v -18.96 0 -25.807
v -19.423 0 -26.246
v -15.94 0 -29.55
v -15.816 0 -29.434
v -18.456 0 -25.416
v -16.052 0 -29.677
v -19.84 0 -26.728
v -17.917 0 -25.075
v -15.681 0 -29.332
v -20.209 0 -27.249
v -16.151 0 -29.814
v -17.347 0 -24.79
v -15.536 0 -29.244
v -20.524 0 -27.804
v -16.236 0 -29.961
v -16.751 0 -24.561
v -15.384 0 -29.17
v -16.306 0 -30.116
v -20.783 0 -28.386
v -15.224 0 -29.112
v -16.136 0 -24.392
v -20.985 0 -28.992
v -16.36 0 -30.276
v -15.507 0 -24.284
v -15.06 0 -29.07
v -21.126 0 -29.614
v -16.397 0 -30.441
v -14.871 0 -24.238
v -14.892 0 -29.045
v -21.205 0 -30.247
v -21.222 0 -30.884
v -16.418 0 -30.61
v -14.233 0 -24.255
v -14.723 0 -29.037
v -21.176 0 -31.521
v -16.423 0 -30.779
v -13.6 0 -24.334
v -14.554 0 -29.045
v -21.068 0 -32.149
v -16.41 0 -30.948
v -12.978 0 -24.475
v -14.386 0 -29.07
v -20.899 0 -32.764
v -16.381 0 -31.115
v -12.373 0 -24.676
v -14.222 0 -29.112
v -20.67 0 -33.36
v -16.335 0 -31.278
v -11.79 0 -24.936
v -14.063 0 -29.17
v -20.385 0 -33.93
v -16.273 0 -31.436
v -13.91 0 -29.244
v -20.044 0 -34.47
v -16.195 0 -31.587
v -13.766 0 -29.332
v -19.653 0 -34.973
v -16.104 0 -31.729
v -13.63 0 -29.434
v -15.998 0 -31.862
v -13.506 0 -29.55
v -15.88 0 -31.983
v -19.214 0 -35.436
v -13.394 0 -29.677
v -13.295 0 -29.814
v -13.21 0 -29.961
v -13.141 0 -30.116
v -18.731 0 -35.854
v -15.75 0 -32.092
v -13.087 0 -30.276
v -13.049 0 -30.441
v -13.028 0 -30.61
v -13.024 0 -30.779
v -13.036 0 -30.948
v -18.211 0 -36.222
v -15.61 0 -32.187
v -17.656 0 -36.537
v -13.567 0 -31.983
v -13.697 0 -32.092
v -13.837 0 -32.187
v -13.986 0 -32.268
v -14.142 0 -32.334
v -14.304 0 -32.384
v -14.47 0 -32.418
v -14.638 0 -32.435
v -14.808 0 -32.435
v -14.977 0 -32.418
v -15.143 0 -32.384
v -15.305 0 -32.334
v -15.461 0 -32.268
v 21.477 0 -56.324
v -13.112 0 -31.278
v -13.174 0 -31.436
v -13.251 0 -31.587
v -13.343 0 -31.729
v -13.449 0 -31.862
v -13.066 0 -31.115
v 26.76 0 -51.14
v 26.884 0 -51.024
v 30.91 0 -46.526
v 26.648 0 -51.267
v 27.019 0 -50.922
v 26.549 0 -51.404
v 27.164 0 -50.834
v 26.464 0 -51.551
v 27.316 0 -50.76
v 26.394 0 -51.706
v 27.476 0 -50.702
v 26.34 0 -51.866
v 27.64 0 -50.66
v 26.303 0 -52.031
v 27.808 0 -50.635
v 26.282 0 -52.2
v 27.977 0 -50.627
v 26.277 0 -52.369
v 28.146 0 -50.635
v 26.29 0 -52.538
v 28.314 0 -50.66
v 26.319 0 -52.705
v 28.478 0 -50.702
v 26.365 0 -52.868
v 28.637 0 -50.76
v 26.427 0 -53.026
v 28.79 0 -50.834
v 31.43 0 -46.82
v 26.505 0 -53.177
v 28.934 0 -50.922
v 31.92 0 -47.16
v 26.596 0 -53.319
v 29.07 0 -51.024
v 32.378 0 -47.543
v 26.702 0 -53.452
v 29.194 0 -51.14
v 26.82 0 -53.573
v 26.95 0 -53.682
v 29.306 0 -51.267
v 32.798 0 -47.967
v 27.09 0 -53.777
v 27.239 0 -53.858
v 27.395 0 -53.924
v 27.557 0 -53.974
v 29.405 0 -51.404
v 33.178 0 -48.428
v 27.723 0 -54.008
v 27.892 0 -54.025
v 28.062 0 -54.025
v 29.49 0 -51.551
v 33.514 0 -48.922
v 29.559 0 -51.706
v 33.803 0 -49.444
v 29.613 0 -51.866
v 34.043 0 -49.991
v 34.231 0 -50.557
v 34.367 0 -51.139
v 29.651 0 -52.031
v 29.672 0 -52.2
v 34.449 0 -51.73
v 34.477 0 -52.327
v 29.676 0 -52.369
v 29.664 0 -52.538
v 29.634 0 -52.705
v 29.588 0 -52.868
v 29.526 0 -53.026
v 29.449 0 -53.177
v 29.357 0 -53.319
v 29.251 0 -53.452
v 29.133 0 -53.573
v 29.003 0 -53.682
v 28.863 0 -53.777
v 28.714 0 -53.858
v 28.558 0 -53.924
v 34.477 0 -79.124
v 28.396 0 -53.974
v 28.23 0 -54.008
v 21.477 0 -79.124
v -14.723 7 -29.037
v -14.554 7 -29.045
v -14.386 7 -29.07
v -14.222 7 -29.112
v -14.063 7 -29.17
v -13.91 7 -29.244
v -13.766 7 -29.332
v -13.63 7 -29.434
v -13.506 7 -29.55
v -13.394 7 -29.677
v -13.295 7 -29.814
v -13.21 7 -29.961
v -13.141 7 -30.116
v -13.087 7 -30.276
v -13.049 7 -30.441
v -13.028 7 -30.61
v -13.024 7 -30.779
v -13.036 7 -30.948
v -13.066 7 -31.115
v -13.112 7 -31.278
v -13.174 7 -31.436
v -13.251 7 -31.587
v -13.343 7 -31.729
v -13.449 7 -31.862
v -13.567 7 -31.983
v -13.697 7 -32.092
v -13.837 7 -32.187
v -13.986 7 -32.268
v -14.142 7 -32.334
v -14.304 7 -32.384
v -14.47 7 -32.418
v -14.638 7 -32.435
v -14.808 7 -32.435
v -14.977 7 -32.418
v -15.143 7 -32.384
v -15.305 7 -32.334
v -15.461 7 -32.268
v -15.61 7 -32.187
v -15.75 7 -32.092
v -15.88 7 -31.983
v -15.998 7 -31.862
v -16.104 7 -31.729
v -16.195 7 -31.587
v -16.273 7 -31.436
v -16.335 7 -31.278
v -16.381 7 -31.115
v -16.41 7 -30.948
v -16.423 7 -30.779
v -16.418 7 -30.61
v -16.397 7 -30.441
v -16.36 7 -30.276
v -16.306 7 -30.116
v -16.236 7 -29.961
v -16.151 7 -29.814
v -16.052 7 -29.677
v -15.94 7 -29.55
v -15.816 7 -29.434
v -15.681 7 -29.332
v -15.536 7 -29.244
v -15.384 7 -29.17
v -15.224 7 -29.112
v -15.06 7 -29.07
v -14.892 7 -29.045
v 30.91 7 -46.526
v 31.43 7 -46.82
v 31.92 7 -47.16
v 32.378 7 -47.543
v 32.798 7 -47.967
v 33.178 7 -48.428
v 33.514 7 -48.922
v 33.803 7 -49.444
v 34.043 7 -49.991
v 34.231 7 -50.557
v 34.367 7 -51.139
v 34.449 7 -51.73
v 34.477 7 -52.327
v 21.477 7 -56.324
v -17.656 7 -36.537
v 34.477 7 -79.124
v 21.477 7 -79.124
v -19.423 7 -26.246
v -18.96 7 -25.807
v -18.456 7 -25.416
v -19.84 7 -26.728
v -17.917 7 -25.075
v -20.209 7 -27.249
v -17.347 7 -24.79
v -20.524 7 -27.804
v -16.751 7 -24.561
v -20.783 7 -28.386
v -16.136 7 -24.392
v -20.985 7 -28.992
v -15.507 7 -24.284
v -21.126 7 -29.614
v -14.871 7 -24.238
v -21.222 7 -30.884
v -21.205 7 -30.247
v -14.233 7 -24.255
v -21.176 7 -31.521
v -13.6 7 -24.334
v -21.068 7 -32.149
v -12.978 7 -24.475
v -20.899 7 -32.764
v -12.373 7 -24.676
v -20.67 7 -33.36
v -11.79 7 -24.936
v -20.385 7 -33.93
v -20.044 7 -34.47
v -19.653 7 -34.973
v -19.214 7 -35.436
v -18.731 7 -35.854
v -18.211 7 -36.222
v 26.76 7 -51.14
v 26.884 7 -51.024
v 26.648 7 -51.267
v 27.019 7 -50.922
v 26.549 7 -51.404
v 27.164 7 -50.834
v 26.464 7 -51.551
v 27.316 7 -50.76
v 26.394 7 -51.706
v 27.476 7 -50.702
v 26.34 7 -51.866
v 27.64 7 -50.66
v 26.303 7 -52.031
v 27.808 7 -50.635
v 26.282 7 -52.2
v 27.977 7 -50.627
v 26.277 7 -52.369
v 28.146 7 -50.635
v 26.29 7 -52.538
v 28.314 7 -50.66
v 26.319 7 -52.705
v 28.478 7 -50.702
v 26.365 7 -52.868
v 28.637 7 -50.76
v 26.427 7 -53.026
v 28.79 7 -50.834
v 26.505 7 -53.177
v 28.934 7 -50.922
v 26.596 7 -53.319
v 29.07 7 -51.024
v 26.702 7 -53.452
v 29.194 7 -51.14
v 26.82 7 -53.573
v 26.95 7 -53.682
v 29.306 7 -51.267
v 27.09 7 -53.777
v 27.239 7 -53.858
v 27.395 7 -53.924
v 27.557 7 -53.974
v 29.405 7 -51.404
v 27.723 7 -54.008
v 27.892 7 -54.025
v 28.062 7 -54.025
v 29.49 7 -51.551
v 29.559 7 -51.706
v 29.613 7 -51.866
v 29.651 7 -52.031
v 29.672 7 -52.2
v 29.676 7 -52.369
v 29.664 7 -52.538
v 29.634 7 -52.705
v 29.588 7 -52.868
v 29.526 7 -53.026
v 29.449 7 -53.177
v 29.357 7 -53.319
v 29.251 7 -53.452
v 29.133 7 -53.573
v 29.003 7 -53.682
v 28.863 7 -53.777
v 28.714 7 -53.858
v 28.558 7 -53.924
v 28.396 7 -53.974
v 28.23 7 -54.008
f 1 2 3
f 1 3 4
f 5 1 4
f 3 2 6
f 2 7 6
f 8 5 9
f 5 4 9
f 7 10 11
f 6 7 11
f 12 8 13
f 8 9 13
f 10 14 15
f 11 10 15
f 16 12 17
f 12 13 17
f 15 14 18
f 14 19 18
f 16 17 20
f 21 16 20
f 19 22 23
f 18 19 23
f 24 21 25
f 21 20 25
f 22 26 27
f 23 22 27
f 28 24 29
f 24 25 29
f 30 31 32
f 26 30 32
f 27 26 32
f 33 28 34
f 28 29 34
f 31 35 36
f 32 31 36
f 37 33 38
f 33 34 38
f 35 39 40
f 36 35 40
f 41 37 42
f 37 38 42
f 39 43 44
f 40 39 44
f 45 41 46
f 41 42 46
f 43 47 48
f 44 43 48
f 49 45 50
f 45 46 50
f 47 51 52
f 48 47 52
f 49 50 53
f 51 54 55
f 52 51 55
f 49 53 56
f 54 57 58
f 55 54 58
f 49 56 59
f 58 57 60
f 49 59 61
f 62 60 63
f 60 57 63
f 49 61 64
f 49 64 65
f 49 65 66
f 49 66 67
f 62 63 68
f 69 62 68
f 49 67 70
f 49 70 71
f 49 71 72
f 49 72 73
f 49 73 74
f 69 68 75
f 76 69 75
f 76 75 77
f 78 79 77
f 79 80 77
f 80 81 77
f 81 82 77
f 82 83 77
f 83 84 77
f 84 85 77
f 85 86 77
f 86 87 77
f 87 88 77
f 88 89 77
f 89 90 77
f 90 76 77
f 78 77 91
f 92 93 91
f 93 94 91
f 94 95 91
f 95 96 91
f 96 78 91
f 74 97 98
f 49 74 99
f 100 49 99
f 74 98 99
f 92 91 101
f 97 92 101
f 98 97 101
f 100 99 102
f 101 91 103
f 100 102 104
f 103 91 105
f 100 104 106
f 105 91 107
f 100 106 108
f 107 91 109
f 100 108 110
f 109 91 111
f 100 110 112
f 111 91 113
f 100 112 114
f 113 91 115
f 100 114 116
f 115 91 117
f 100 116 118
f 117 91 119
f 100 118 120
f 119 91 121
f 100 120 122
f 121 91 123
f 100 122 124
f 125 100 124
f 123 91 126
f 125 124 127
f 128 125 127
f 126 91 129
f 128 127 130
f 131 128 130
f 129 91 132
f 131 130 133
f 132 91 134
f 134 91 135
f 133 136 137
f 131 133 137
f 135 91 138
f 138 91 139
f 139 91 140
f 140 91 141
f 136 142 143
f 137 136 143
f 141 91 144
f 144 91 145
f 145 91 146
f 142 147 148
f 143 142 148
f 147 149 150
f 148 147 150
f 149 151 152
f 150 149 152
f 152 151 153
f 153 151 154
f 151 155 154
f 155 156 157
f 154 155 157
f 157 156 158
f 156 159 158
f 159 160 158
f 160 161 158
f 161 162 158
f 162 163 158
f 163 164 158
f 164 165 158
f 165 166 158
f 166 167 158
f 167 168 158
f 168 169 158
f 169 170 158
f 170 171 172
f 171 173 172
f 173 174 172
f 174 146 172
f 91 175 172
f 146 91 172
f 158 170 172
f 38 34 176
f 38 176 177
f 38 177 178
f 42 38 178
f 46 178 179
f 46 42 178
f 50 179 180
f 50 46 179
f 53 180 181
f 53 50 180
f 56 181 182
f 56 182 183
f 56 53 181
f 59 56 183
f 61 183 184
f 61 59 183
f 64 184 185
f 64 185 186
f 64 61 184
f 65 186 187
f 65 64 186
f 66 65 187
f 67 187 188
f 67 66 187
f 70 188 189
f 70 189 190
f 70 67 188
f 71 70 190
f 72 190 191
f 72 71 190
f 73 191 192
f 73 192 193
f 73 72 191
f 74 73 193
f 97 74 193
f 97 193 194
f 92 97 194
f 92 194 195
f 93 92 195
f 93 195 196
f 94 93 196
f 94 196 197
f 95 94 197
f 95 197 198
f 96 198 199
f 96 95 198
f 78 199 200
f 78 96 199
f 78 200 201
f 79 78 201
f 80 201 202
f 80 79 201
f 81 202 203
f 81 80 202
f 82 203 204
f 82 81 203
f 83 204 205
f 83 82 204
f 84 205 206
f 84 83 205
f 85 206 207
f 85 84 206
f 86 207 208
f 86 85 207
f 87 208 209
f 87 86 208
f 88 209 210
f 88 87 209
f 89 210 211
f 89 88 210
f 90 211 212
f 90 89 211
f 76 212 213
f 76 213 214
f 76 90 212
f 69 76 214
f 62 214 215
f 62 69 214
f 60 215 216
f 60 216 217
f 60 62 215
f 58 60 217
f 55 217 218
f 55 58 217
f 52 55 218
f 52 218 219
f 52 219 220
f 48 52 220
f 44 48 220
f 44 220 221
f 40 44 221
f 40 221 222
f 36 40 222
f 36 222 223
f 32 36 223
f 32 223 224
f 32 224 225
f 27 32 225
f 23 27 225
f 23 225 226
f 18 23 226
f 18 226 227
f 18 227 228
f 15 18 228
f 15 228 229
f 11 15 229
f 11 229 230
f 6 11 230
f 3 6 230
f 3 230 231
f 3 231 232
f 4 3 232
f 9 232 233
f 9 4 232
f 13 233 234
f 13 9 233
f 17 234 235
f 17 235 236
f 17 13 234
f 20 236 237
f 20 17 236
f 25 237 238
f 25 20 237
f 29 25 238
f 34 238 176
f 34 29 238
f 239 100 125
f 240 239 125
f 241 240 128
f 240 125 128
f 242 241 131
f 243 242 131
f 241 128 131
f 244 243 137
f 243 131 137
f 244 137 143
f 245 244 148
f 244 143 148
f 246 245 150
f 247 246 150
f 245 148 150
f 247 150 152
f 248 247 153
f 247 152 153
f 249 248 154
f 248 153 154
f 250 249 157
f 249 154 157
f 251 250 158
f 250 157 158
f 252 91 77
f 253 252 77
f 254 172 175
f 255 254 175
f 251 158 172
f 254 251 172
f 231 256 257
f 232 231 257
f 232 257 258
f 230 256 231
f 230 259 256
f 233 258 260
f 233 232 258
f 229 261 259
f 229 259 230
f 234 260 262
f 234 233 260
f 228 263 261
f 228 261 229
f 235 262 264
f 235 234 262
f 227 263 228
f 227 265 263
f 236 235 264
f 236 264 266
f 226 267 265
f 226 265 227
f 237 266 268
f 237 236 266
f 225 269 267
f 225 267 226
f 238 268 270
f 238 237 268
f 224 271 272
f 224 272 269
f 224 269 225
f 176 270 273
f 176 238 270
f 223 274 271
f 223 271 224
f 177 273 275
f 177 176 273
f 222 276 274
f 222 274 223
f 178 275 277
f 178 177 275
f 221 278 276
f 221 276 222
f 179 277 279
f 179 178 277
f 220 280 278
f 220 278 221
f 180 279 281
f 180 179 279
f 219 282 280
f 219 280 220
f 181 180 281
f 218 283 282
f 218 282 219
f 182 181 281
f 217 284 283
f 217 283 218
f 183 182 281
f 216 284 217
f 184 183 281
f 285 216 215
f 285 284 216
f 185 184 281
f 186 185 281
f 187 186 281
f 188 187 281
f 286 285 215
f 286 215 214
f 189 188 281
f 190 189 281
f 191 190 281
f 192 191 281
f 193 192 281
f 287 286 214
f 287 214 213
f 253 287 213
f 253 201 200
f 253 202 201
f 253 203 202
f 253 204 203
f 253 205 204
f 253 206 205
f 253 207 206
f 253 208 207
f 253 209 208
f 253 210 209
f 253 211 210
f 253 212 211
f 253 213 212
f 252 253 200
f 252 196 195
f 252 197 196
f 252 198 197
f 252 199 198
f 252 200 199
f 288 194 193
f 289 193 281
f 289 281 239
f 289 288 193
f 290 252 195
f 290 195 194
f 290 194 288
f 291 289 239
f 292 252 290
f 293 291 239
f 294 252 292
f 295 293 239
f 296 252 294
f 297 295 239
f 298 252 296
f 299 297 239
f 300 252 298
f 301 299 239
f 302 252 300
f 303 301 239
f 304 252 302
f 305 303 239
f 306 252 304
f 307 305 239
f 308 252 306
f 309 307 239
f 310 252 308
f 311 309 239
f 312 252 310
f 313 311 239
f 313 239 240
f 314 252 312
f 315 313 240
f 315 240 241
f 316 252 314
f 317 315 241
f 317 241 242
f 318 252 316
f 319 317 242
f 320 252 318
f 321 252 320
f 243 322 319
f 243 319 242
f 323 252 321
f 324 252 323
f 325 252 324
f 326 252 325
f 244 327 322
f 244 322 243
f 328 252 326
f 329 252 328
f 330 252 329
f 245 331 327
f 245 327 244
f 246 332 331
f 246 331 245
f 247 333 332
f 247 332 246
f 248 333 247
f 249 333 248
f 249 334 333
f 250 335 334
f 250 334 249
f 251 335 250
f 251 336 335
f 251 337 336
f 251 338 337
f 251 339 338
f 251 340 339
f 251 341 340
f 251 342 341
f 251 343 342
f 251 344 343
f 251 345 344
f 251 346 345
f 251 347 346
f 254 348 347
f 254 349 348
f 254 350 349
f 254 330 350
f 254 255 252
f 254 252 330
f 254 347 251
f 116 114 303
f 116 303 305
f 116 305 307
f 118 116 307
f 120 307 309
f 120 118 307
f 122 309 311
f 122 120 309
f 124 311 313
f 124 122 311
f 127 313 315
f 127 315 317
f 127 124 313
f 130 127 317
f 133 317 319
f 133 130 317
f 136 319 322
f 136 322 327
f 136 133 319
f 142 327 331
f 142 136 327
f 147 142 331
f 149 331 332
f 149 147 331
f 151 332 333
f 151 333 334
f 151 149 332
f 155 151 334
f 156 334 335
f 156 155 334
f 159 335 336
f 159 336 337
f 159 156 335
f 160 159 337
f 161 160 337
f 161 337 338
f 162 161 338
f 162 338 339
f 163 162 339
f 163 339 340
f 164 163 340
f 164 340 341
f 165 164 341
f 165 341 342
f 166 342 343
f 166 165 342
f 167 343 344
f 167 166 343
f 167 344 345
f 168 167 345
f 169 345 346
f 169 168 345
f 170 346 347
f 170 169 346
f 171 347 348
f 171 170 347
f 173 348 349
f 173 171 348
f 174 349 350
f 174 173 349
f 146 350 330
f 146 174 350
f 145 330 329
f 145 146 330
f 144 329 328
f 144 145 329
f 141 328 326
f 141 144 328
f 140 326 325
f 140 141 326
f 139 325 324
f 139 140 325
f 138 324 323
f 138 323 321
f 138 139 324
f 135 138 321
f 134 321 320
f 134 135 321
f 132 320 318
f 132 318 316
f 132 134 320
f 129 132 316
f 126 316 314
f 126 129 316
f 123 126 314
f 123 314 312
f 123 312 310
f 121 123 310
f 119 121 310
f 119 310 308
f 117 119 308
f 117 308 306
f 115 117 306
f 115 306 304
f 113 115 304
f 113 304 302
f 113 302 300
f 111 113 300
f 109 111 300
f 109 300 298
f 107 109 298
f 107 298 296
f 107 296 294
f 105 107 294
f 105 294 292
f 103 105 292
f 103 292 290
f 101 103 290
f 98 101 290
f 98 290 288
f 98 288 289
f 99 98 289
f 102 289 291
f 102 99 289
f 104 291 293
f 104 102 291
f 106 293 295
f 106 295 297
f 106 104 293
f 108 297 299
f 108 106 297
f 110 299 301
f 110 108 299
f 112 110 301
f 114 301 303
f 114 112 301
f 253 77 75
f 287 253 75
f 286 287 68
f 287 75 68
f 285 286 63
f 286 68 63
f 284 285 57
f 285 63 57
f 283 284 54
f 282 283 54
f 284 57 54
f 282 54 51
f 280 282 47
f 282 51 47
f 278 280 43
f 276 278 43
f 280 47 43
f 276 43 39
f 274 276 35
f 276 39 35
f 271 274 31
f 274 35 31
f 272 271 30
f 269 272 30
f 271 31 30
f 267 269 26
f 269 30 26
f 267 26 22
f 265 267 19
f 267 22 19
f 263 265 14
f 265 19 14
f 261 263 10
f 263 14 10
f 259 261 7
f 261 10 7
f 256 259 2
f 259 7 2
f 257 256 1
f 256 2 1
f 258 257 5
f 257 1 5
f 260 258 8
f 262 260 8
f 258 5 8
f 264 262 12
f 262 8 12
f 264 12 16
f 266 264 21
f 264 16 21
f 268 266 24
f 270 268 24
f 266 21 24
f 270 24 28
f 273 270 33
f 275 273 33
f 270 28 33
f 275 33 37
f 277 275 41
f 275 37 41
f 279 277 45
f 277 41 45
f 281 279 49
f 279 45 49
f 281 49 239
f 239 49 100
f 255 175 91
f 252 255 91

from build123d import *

# Parameters (mm, degrees)
SKETCH2_R           = 1.7
BOSS_EXTRUDE1_DEPTH = 7


with BuildPart() as part:
    # Sketch2 → Boss-Extrude1 (new body)
    with BuildSketch(Plane(origin=(0, 0, 0), x_dir=(1, 0, 0), z_dir=(0, 1, 0))):
        with BuildLine():
            Line((21.476765834, 56.323790381), (-17.656175951, 36.537368528))
            ThreePointArc((-17.656175951, 36.537368528), (-20.523911064, 27.803749844), (-11.79029238, 24.93601473))
            Line((-11.79029238, 24.93601473), (30.909707619, 46.52601473))
            ThreePointArc((30.909707619, 46.52601473), (33.5136477, 48.921851075), (34.476765834, 52.326691629))
            Line((34.476765834, 52.326691629), (34.476765834, 79.124442117))
            Line((34.476765834, 79.124442117), (21.476765834, 79.124442117))
            Line((21.476765834, 79.124442117), (21.476765834, 56.323790381))
        make_face()
        with Locations(Location((-14.723234165, 30.736691629, 0), (0, 0, 270))):
            Circle(SKETCH2_R, mode=Mode.SUBTRACT)
        with Locations(Location((27.976765834, 52.326691629, 0), (0, 0, 270))):
            Circle(SKETCH2_R, mode=Mode.SUBTRACT)
    extrude(amount=BOSS_EXTRUDE1_DEPTH)


solid = part.part
